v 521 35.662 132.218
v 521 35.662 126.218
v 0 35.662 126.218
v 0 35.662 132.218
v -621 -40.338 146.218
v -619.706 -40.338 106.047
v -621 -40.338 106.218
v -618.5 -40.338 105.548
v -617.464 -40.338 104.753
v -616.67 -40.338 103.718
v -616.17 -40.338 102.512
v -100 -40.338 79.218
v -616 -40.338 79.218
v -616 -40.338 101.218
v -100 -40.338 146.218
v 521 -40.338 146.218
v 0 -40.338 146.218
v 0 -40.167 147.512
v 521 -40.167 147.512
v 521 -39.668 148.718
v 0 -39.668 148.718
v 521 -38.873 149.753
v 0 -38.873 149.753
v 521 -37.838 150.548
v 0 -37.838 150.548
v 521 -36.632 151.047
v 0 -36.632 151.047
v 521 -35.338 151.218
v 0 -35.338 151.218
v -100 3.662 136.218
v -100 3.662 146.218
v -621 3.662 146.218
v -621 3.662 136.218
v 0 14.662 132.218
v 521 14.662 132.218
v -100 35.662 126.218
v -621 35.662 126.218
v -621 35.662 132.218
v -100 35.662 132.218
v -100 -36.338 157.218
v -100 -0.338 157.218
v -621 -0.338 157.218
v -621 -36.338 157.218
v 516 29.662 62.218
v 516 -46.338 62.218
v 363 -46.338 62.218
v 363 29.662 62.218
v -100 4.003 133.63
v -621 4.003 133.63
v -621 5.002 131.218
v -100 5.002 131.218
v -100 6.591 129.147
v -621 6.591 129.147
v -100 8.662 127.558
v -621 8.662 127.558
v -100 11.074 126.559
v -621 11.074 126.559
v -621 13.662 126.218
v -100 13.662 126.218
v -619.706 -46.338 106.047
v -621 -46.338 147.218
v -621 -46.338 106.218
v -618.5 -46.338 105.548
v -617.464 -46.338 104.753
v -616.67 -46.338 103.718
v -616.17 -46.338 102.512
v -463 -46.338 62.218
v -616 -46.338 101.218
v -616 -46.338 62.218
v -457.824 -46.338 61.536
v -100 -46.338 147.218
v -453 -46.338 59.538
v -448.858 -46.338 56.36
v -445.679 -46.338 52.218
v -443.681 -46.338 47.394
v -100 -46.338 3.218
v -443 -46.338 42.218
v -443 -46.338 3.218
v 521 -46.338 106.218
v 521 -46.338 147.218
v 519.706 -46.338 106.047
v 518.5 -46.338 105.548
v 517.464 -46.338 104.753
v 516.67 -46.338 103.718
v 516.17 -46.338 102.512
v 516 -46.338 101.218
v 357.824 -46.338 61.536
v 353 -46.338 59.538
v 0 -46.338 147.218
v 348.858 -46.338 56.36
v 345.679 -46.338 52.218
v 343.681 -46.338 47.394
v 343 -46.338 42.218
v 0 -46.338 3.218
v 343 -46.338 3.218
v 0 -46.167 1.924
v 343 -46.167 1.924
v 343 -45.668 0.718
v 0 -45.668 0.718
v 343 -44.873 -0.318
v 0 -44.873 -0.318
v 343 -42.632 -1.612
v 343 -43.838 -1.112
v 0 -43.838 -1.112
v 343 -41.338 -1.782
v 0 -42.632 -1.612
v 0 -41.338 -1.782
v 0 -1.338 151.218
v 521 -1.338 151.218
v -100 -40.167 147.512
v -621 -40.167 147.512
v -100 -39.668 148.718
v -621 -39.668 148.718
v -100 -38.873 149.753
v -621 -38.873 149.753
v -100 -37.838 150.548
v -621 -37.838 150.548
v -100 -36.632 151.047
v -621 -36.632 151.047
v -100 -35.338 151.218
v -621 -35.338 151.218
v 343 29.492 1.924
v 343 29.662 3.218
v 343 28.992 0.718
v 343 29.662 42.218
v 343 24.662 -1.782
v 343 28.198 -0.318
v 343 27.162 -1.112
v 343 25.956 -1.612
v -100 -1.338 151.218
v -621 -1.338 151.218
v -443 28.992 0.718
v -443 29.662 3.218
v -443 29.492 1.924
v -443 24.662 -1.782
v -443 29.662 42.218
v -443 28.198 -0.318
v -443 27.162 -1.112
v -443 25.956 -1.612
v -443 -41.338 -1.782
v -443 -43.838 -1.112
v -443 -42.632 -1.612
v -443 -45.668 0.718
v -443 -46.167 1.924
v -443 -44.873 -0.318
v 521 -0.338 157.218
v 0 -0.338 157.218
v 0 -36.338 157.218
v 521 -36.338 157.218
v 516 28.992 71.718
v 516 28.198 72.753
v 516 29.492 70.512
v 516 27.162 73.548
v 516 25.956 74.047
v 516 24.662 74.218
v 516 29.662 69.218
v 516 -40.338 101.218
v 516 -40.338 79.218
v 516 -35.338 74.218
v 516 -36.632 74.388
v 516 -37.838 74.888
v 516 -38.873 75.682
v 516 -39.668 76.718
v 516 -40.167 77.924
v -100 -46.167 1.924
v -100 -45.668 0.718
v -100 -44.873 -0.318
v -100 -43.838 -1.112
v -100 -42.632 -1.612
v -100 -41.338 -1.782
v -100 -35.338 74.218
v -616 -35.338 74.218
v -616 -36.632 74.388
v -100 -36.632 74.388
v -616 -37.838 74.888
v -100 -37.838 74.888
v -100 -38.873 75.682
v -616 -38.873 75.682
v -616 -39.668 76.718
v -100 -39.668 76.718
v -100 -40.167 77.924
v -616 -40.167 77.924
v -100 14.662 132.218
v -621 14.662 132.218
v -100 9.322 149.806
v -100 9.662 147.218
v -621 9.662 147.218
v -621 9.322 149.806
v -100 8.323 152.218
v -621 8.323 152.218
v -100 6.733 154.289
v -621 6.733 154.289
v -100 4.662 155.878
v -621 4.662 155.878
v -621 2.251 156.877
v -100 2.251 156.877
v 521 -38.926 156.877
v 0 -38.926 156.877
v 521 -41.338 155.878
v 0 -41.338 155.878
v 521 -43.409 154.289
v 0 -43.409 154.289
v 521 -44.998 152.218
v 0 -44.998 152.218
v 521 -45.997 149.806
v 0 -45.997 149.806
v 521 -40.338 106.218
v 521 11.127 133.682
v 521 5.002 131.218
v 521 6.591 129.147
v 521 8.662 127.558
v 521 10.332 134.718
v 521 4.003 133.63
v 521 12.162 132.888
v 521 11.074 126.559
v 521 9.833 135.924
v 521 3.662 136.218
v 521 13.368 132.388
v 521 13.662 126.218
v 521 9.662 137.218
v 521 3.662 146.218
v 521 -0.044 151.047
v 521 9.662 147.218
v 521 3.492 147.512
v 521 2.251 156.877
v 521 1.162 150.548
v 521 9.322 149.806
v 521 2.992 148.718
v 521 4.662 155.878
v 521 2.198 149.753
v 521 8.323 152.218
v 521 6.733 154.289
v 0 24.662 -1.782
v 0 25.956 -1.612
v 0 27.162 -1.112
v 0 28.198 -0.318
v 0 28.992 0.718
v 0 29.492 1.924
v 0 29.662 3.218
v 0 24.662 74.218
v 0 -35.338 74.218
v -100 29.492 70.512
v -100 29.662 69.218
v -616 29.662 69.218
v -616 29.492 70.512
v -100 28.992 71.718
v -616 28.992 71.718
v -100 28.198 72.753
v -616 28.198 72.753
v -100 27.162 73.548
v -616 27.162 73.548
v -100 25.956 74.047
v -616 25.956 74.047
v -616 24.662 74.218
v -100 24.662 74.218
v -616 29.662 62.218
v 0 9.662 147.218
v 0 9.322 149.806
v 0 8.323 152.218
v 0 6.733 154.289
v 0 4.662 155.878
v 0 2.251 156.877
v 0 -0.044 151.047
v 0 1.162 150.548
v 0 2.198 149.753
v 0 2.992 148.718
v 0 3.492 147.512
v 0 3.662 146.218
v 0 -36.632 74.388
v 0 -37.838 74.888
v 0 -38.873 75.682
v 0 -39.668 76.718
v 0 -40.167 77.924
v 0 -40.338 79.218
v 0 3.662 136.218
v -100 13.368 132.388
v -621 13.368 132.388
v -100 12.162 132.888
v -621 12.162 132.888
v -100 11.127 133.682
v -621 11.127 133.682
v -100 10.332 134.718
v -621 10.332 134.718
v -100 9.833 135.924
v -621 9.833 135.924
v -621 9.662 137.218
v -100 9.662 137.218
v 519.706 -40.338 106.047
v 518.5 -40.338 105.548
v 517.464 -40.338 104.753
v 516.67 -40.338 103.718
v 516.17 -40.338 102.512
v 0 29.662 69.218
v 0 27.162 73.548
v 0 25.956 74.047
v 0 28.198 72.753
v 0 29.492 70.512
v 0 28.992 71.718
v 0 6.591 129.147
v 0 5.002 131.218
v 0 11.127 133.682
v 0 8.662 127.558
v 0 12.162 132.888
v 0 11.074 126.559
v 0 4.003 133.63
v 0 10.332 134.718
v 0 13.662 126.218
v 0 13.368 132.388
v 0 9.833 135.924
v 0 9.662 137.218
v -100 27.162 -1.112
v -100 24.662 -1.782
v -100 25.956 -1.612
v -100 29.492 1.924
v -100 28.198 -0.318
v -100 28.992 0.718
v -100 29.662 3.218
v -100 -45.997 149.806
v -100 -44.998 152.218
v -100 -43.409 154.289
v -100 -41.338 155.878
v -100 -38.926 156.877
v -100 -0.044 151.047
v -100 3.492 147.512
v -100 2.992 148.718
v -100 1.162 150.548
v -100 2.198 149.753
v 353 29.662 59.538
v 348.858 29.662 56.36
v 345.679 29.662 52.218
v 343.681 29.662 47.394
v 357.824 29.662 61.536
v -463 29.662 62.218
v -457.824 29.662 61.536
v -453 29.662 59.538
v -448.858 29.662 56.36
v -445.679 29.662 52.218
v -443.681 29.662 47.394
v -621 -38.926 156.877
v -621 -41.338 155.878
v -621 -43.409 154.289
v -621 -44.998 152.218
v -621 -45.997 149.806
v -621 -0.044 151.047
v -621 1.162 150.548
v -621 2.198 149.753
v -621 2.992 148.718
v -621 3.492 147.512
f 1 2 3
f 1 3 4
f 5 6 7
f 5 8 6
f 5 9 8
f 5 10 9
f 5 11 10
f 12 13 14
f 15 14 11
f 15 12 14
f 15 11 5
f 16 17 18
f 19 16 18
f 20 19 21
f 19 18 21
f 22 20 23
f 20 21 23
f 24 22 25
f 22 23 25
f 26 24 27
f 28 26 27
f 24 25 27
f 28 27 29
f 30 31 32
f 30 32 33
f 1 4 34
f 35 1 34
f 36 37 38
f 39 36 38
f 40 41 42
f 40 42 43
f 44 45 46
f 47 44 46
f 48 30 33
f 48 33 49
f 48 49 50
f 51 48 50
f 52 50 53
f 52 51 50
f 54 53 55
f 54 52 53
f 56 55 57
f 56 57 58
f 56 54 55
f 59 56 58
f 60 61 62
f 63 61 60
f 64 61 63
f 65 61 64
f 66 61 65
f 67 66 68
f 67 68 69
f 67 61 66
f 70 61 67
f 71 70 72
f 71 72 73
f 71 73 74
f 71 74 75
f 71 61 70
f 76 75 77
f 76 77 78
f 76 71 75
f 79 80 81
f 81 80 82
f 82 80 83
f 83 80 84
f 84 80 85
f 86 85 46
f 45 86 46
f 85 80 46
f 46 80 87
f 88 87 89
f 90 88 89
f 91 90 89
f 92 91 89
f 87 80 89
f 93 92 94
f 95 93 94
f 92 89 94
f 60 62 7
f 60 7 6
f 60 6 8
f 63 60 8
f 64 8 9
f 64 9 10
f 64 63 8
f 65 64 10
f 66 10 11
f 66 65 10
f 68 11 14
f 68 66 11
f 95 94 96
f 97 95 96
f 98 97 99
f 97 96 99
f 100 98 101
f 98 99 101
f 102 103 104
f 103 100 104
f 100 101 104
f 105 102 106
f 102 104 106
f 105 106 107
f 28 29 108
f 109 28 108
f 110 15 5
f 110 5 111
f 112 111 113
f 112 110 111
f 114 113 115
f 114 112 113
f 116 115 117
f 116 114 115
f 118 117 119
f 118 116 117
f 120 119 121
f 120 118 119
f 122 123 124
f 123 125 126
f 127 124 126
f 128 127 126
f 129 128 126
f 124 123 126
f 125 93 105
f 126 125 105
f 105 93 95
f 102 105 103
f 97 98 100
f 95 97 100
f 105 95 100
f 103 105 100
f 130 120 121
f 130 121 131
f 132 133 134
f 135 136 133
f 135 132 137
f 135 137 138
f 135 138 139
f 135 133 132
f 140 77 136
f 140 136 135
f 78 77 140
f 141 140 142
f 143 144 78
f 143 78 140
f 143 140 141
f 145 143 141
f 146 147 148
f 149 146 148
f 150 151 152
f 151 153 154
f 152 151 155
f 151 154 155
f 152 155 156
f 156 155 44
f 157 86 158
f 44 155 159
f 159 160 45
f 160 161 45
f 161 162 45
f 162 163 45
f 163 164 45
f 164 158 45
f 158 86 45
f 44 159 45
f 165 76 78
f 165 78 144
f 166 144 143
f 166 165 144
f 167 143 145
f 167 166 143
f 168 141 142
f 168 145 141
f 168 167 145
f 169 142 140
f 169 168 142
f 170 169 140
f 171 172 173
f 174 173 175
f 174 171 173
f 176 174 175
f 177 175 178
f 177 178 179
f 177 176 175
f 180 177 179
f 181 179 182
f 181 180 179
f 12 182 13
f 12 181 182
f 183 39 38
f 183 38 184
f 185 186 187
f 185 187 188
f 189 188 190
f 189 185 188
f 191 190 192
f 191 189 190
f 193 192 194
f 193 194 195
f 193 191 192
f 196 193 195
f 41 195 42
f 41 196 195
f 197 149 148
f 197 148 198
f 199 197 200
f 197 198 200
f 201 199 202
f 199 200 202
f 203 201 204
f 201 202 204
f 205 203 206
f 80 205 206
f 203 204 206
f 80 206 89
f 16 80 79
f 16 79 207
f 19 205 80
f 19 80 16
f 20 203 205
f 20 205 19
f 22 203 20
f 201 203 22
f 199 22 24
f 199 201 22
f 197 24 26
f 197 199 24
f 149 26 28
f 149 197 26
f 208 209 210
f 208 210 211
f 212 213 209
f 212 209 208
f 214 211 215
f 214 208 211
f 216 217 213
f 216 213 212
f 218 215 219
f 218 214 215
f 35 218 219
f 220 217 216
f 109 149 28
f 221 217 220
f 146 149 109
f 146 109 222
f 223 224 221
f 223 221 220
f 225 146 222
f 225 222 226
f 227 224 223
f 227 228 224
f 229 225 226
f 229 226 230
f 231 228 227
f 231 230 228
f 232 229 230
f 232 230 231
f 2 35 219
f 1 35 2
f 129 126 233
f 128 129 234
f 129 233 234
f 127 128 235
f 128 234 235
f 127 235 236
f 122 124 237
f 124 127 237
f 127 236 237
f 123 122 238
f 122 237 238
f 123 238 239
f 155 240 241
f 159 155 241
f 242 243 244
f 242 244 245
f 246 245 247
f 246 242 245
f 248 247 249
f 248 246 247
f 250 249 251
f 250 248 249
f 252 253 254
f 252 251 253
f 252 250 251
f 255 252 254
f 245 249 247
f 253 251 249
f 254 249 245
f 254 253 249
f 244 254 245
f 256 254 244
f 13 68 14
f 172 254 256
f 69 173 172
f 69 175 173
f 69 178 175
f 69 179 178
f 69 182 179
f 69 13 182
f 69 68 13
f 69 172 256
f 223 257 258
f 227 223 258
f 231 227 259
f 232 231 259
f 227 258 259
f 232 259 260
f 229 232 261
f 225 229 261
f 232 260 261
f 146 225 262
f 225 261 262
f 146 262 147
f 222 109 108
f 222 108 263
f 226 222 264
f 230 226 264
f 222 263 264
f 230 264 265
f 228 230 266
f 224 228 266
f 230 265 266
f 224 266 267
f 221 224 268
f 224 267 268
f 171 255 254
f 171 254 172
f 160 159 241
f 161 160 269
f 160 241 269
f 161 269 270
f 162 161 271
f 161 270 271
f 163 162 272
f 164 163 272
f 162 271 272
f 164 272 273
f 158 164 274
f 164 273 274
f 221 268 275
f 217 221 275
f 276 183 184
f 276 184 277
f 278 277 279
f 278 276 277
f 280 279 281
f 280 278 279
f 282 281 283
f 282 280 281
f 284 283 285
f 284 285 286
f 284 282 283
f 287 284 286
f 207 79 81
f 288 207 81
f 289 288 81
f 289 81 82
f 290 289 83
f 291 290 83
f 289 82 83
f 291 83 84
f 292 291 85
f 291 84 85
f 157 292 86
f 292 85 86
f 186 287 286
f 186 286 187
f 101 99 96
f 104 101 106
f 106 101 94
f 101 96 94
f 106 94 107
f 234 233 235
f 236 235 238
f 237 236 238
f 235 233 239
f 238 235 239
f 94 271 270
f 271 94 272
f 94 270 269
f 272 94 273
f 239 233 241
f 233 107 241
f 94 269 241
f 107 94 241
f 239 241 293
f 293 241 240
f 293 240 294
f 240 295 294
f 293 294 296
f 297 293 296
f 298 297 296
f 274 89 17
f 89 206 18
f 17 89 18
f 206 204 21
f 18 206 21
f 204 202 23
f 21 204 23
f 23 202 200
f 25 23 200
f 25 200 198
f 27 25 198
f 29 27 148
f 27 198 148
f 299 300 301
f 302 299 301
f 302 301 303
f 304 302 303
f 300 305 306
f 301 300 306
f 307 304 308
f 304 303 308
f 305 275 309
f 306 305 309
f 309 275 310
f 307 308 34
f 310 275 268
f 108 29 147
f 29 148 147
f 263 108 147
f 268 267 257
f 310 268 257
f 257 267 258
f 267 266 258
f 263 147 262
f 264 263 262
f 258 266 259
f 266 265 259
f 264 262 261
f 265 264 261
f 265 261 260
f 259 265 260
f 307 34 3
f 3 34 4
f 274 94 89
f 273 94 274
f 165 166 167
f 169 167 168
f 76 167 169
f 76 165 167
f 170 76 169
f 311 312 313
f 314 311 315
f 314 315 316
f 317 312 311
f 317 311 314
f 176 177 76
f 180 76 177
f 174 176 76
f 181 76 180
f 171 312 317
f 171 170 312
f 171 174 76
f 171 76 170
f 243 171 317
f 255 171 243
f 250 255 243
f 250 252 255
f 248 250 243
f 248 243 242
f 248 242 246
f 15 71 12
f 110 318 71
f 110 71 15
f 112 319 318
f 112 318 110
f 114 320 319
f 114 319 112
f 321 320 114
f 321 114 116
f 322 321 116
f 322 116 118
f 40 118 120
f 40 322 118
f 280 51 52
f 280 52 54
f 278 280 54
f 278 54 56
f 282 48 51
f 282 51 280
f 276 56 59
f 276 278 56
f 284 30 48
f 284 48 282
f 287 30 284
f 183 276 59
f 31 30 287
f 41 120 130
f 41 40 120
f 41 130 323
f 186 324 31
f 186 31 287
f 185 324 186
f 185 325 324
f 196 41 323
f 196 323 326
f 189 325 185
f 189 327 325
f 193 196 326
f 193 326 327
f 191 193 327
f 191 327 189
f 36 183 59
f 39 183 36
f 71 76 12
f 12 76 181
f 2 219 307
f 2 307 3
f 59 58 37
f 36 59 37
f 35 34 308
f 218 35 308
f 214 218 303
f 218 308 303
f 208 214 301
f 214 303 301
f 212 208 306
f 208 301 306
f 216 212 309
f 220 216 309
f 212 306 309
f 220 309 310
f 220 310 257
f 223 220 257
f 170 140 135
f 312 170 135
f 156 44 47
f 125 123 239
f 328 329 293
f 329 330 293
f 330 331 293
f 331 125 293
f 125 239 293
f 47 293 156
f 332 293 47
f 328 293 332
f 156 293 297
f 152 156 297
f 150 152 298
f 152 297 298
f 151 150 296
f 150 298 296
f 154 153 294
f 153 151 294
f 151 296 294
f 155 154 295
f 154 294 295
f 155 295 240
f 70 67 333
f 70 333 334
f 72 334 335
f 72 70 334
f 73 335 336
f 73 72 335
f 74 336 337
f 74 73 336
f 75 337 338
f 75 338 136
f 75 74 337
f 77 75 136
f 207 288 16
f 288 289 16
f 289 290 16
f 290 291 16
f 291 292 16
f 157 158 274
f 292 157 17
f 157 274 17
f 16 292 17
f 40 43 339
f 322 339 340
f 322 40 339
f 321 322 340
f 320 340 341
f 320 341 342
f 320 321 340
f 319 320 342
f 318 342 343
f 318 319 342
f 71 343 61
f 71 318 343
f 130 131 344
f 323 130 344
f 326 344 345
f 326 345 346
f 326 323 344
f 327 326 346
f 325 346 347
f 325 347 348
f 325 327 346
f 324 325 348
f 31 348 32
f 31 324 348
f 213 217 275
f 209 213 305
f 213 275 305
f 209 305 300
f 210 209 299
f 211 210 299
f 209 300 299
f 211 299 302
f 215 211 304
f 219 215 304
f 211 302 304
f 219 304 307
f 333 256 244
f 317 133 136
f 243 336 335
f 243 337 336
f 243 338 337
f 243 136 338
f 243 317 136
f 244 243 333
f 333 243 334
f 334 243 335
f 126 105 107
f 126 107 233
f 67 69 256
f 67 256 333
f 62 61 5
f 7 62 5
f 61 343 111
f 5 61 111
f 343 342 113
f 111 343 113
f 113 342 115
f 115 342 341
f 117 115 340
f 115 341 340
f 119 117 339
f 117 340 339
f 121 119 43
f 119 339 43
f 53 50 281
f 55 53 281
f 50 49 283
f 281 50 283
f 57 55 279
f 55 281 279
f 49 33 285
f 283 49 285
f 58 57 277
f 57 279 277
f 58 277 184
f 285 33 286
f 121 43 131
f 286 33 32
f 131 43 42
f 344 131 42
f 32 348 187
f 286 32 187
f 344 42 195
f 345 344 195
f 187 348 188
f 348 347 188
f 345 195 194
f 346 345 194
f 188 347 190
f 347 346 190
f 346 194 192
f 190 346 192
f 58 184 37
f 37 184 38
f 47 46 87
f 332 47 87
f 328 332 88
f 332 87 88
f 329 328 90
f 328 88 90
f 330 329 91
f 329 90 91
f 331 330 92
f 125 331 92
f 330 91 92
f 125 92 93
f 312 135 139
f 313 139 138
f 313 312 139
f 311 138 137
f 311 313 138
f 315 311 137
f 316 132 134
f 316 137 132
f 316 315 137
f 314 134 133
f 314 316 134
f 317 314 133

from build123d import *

# Parameters (mm, degrees)
F1_DEPTH = 521
F2_W     = 178
F2_H     = 13.925067
F3_DEPTH = 76


with BuildPart() as f1:
    # F0 (on Right) → F1 (new body)
    with BuildSketch(Plane.YZ):
        with BuildLine():
            Line((35.662354, 126.217782), (35.662354, 132.217782))
            Line((35.662354, 132.217782), (14.662354, 132.217782))
            ThreePointArc((14.662354, 132.217782), (11.126821, 133.682248), (9.662354, 137.217782))
            Line((9.662354, 137.217782), (9.662354, 147.217782))
            ThreePointArc((9.662354, 147.217782), (6.733422, 154.28885), (-0.337646, 157.217782))
            Line((-0.337646, 157.217782), (-36.337646, 157.217782))
            ThreePointArc((-36.337646, 157.217782), (-43.408713, 154.28885), (-46.337646, 147.217782))
            Line((-46.337646, 147.217782), (-46.337646, 3.217782))
            ThreePointArc((-46.337646, 3.217782), (-44.873179, -0.317752), (-41.337646, -1.782218))
            Line((-41.337646, -1.782218), (24.662354, -1.782218))
            ThreePointArc((24.662354, -1.782218), (28.197888, -0.317752), (29.662354, 3.217782))
            Line((29.662354, 3.217782), (29.662354, 69.217782))
            ThreePointArc((29.662354, 69.217782), (28.197888, 72.753316), (24.662354, 74.217782))
            Line((24.662354, 74.217782), (-35.337646, 74.217782))
            ThreePointArc((-35.337646, 74.217782), (-38.873179, 75.682248), (-40.337646, 79.217782))
            Line((-40.337646, 79.217782), (-40.337646, 146.217782))
            ThreePointArc((-40.337646, 146.217782), (-38.873179, 149.753316), (-35.337646, 151.217782))
            Line((-35.337646, 151.217782), (-1.337646, 151.217782))
            ThreePointArc((-1.337646, 151.217782), (2.197888, 149.753316), (3.662354, 146.217782))
            Line((3.662354, 146.217782), (3.662354, 136.217782))
            ThreePointArc((3.662354, 136.217782), (6.591287, 129.146714), (13.662354, 126.217782))
            Line((13.662354, 126.217782), (35.662354, 126.217782))
        make_face()
    extrude(amount=F1_DEPTH)

    # F2 (on face) → F3 (cut)
    with BuildSketch(Plane.XZ.offset(46.337646)):
        with BuildLine():
            ThreePointArc((521, 106.217782), (517.464466, 104.753316), (516, 101.217782))
            Line((516, 101.217782), (516, 62.217782))
            Line((516, 62.217782), (363, 62.217782))
            ThreePointArc((363, 62.217782), (348.857864, 56.359917), (343, 42.217782))
            Line((343, 42.217782), (343, 3.217782))
            Line((343, 3.217782), (521, 3.217782))
            Line((521, 3.217782), (521, 106.217782))
        make_face()
        with Locations((432, -3.744751)):
            Rectangle(F2_W, F2_H)
    extrude(amount=-F3_DEPTH, mode=Mode.SUBTRACT)


with BuildPart() as f5_1:
    # F5: instance of F1
    add(f1.part.mirror(Plane.YZ.offset(-50)))


solid = Compound([f1.part, f5_1.part])
